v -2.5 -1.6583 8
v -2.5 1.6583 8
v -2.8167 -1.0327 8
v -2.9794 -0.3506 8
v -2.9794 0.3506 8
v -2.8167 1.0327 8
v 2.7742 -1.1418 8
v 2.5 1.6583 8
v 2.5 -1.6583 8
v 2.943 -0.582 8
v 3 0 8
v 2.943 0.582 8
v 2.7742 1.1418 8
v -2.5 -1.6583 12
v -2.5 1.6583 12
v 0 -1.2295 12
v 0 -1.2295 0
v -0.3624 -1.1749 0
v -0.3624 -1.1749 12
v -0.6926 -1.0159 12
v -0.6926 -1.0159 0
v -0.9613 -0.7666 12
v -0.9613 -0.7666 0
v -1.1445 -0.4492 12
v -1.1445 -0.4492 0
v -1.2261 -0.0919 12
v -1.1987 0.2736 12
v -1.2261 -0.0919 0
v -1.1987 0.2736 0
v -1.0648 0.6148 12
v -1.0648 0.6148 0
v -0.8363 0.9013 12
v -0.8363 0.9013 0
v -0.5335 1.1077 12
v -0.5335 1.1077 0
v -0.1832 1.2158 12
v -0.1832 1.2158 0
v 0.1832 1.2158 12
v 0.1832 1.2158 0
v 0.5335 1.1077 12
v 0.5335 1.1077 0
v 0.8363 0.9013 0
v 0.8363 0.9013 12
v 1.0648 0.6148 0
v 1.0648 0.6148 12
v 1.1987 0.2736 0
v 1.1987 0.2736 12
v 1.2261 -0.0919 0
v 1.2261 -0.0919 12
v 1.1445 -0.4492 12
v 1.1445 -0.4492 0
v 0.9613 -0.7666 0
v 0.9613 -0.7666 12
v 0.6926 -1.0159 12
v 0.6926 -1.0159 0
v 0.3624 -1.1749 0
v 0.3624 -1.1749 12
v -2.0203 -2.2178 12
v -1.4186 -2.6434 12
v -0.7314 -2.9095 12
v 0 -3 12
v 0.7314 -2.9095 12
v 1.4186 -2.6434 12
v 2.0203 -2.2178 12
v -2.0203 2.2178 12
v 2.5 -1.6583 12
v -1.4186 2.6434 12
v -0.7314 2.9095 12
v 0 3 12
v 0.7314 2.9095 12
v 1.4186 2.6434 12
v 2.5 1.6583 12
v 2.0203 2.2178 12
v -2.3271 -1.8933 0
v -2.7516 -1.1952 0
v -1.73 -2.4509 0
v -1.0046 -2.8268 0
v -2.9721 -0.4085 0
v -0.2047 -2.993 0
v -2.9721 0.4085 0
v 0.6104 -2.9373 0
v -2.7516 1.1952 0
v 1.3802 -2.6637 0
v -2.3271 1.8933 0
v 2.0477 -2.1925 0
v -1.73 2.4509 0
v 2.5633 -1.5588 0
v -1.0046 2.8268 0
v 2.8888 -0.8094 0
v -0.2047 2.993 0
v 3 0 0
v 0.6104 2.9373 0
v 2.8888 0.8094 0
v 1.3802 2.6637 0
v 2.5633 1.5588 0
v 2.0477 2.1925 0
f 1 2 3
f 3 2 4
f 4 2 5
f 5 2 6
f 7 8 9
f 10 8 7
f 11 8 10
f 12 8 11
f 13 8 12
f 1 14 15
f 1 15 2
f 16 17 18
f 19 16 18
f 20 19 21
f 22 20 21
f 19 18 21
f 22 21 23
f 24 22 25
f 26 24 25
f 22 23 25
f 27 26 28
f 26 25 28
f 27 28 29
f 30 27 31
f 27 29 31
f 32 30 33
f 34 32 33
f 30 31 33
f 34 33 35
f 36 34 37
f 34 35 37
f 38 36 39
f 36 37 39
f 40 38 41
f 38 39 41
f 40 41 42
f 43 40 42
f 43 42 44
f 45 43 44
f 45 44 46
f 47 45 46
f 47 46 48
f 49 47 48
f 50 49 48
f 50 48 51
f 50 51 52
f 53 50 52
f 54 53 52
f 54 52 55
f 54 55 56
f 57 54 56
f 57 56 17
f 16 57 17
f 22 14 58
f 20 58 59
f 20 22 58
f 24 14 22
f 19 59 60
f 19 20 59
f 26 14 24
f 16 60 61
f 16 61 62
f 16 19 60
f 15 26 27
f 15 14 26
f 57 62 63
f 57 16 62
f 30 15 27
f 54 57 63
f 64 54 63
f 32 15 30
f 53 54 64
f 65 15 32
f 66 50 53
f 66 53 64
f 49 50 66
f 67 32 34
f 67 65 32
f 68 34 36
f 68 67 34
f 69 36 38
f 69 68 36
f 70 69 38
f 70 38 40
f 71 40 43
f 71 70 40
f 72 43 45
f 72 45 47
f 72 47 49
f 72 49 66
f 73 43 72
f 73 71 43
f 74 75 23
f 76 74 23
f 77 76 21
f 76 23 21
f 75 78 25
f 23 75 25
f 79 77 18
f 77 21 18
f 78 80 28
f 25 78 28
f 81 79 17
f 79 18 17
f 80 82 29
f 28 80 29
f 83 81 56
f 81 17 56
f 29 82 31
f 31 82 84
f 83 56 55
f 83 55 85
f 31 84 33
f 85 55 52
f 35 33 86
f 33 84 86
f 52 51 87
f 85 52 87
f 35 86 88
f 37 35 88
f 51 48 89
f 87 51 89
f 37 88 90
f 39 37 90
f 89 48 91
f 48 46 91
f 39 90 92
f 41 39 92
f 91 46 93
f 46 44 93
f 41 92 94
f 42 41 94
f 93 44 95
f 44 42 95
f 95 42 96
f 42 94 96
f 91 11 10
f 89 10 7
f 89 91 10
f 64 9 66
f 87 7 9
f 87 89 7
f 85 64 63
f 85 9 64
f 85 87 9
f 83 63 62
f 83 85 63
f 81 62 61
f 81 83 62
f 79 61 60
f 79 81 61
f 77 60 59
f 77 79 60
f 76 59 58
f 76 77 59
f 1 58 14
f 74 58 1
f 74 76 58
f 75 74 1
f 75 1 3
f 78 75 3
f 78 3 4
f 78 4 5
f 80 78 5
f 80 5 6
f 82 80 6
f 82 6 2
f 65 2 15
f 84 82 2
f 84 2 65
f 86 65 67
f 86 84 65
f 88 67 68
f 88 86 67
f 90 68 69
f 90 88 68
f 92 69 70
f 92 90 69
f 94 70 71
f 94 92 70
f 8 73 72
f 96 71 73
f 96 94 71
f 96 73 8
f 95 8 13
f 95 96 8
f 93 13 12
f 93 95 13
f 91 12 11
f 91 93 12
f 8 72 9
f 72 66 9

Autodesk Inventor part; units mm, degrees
ref_plane "YZ Plane" through (0, 0, 0) normal (1, 0, 0) x (0, 1, 0)
ref_plane "XZ Plane" through (0, 0, 0) normal (0, 1, 0) x (-1, 0, 0)
ref_plane "XY Plane" through (0, 0, 0) normal (0, 0, 1) x (1, 0, 0)
sketch "Sketch1" plane through (0, 0, 0) normal (0, 0, 1) x (1, 0, 0)
  circle A0 centre (0, 0) radius 3
  dimension "d0" = 6
extrude "Extrusion1" add sketch "Sketch1" along normal blind 12
sketch "Sketch2" plane through (0, 0, 12) normal (0, 0, 1) x (1, 0, 0)
  point P0 (0, 0)
  point P1 (0, 0)
hole "Hole1" at (0, 0, 12) direction (0, 0, -1) diameter 2.459 end through all thread size "M3x0.5" class "6H" standard "ANSI Metric M Profile"
sketch "Sketch3" plane through (0, 0, 0) normal (0, 1, 0) x (-1, 0, 0)
  line L0 (3, 0) -> (3, 12) projected
  line L1 (3, 12) -> (2.5, 12)
  line L2 (2.5, 12) -> (2.5, 8)
  line L3 (2.5, 8) -> (3, 8)
  line L4 (3, 8) -> (3, 12)
  line L5 (3, 12) -> (-3, 12) projected
  line L6 (-3, 12) -> (-2.5, 12)
  line L7 (-2.5, 12) -> (-2.5, 8)
  line L8 (-2.5, 8) -> (-3, 8)
  line L9 (-3, 8) -> (-3, 12)
  point P0 (0, 0)
  dimension "d10" = 0.5
  dimension "d11" = 5
  dimension "d12" = 0.5
  dimension "d13" = 4
extrude "Extrusion2" cut sketch "Sketch3" along normal through all both and the other way through all
equation "\"d10\" = d12"
properties part number "Pancake_Lever Weight 2" material "Aluminum 6061"
